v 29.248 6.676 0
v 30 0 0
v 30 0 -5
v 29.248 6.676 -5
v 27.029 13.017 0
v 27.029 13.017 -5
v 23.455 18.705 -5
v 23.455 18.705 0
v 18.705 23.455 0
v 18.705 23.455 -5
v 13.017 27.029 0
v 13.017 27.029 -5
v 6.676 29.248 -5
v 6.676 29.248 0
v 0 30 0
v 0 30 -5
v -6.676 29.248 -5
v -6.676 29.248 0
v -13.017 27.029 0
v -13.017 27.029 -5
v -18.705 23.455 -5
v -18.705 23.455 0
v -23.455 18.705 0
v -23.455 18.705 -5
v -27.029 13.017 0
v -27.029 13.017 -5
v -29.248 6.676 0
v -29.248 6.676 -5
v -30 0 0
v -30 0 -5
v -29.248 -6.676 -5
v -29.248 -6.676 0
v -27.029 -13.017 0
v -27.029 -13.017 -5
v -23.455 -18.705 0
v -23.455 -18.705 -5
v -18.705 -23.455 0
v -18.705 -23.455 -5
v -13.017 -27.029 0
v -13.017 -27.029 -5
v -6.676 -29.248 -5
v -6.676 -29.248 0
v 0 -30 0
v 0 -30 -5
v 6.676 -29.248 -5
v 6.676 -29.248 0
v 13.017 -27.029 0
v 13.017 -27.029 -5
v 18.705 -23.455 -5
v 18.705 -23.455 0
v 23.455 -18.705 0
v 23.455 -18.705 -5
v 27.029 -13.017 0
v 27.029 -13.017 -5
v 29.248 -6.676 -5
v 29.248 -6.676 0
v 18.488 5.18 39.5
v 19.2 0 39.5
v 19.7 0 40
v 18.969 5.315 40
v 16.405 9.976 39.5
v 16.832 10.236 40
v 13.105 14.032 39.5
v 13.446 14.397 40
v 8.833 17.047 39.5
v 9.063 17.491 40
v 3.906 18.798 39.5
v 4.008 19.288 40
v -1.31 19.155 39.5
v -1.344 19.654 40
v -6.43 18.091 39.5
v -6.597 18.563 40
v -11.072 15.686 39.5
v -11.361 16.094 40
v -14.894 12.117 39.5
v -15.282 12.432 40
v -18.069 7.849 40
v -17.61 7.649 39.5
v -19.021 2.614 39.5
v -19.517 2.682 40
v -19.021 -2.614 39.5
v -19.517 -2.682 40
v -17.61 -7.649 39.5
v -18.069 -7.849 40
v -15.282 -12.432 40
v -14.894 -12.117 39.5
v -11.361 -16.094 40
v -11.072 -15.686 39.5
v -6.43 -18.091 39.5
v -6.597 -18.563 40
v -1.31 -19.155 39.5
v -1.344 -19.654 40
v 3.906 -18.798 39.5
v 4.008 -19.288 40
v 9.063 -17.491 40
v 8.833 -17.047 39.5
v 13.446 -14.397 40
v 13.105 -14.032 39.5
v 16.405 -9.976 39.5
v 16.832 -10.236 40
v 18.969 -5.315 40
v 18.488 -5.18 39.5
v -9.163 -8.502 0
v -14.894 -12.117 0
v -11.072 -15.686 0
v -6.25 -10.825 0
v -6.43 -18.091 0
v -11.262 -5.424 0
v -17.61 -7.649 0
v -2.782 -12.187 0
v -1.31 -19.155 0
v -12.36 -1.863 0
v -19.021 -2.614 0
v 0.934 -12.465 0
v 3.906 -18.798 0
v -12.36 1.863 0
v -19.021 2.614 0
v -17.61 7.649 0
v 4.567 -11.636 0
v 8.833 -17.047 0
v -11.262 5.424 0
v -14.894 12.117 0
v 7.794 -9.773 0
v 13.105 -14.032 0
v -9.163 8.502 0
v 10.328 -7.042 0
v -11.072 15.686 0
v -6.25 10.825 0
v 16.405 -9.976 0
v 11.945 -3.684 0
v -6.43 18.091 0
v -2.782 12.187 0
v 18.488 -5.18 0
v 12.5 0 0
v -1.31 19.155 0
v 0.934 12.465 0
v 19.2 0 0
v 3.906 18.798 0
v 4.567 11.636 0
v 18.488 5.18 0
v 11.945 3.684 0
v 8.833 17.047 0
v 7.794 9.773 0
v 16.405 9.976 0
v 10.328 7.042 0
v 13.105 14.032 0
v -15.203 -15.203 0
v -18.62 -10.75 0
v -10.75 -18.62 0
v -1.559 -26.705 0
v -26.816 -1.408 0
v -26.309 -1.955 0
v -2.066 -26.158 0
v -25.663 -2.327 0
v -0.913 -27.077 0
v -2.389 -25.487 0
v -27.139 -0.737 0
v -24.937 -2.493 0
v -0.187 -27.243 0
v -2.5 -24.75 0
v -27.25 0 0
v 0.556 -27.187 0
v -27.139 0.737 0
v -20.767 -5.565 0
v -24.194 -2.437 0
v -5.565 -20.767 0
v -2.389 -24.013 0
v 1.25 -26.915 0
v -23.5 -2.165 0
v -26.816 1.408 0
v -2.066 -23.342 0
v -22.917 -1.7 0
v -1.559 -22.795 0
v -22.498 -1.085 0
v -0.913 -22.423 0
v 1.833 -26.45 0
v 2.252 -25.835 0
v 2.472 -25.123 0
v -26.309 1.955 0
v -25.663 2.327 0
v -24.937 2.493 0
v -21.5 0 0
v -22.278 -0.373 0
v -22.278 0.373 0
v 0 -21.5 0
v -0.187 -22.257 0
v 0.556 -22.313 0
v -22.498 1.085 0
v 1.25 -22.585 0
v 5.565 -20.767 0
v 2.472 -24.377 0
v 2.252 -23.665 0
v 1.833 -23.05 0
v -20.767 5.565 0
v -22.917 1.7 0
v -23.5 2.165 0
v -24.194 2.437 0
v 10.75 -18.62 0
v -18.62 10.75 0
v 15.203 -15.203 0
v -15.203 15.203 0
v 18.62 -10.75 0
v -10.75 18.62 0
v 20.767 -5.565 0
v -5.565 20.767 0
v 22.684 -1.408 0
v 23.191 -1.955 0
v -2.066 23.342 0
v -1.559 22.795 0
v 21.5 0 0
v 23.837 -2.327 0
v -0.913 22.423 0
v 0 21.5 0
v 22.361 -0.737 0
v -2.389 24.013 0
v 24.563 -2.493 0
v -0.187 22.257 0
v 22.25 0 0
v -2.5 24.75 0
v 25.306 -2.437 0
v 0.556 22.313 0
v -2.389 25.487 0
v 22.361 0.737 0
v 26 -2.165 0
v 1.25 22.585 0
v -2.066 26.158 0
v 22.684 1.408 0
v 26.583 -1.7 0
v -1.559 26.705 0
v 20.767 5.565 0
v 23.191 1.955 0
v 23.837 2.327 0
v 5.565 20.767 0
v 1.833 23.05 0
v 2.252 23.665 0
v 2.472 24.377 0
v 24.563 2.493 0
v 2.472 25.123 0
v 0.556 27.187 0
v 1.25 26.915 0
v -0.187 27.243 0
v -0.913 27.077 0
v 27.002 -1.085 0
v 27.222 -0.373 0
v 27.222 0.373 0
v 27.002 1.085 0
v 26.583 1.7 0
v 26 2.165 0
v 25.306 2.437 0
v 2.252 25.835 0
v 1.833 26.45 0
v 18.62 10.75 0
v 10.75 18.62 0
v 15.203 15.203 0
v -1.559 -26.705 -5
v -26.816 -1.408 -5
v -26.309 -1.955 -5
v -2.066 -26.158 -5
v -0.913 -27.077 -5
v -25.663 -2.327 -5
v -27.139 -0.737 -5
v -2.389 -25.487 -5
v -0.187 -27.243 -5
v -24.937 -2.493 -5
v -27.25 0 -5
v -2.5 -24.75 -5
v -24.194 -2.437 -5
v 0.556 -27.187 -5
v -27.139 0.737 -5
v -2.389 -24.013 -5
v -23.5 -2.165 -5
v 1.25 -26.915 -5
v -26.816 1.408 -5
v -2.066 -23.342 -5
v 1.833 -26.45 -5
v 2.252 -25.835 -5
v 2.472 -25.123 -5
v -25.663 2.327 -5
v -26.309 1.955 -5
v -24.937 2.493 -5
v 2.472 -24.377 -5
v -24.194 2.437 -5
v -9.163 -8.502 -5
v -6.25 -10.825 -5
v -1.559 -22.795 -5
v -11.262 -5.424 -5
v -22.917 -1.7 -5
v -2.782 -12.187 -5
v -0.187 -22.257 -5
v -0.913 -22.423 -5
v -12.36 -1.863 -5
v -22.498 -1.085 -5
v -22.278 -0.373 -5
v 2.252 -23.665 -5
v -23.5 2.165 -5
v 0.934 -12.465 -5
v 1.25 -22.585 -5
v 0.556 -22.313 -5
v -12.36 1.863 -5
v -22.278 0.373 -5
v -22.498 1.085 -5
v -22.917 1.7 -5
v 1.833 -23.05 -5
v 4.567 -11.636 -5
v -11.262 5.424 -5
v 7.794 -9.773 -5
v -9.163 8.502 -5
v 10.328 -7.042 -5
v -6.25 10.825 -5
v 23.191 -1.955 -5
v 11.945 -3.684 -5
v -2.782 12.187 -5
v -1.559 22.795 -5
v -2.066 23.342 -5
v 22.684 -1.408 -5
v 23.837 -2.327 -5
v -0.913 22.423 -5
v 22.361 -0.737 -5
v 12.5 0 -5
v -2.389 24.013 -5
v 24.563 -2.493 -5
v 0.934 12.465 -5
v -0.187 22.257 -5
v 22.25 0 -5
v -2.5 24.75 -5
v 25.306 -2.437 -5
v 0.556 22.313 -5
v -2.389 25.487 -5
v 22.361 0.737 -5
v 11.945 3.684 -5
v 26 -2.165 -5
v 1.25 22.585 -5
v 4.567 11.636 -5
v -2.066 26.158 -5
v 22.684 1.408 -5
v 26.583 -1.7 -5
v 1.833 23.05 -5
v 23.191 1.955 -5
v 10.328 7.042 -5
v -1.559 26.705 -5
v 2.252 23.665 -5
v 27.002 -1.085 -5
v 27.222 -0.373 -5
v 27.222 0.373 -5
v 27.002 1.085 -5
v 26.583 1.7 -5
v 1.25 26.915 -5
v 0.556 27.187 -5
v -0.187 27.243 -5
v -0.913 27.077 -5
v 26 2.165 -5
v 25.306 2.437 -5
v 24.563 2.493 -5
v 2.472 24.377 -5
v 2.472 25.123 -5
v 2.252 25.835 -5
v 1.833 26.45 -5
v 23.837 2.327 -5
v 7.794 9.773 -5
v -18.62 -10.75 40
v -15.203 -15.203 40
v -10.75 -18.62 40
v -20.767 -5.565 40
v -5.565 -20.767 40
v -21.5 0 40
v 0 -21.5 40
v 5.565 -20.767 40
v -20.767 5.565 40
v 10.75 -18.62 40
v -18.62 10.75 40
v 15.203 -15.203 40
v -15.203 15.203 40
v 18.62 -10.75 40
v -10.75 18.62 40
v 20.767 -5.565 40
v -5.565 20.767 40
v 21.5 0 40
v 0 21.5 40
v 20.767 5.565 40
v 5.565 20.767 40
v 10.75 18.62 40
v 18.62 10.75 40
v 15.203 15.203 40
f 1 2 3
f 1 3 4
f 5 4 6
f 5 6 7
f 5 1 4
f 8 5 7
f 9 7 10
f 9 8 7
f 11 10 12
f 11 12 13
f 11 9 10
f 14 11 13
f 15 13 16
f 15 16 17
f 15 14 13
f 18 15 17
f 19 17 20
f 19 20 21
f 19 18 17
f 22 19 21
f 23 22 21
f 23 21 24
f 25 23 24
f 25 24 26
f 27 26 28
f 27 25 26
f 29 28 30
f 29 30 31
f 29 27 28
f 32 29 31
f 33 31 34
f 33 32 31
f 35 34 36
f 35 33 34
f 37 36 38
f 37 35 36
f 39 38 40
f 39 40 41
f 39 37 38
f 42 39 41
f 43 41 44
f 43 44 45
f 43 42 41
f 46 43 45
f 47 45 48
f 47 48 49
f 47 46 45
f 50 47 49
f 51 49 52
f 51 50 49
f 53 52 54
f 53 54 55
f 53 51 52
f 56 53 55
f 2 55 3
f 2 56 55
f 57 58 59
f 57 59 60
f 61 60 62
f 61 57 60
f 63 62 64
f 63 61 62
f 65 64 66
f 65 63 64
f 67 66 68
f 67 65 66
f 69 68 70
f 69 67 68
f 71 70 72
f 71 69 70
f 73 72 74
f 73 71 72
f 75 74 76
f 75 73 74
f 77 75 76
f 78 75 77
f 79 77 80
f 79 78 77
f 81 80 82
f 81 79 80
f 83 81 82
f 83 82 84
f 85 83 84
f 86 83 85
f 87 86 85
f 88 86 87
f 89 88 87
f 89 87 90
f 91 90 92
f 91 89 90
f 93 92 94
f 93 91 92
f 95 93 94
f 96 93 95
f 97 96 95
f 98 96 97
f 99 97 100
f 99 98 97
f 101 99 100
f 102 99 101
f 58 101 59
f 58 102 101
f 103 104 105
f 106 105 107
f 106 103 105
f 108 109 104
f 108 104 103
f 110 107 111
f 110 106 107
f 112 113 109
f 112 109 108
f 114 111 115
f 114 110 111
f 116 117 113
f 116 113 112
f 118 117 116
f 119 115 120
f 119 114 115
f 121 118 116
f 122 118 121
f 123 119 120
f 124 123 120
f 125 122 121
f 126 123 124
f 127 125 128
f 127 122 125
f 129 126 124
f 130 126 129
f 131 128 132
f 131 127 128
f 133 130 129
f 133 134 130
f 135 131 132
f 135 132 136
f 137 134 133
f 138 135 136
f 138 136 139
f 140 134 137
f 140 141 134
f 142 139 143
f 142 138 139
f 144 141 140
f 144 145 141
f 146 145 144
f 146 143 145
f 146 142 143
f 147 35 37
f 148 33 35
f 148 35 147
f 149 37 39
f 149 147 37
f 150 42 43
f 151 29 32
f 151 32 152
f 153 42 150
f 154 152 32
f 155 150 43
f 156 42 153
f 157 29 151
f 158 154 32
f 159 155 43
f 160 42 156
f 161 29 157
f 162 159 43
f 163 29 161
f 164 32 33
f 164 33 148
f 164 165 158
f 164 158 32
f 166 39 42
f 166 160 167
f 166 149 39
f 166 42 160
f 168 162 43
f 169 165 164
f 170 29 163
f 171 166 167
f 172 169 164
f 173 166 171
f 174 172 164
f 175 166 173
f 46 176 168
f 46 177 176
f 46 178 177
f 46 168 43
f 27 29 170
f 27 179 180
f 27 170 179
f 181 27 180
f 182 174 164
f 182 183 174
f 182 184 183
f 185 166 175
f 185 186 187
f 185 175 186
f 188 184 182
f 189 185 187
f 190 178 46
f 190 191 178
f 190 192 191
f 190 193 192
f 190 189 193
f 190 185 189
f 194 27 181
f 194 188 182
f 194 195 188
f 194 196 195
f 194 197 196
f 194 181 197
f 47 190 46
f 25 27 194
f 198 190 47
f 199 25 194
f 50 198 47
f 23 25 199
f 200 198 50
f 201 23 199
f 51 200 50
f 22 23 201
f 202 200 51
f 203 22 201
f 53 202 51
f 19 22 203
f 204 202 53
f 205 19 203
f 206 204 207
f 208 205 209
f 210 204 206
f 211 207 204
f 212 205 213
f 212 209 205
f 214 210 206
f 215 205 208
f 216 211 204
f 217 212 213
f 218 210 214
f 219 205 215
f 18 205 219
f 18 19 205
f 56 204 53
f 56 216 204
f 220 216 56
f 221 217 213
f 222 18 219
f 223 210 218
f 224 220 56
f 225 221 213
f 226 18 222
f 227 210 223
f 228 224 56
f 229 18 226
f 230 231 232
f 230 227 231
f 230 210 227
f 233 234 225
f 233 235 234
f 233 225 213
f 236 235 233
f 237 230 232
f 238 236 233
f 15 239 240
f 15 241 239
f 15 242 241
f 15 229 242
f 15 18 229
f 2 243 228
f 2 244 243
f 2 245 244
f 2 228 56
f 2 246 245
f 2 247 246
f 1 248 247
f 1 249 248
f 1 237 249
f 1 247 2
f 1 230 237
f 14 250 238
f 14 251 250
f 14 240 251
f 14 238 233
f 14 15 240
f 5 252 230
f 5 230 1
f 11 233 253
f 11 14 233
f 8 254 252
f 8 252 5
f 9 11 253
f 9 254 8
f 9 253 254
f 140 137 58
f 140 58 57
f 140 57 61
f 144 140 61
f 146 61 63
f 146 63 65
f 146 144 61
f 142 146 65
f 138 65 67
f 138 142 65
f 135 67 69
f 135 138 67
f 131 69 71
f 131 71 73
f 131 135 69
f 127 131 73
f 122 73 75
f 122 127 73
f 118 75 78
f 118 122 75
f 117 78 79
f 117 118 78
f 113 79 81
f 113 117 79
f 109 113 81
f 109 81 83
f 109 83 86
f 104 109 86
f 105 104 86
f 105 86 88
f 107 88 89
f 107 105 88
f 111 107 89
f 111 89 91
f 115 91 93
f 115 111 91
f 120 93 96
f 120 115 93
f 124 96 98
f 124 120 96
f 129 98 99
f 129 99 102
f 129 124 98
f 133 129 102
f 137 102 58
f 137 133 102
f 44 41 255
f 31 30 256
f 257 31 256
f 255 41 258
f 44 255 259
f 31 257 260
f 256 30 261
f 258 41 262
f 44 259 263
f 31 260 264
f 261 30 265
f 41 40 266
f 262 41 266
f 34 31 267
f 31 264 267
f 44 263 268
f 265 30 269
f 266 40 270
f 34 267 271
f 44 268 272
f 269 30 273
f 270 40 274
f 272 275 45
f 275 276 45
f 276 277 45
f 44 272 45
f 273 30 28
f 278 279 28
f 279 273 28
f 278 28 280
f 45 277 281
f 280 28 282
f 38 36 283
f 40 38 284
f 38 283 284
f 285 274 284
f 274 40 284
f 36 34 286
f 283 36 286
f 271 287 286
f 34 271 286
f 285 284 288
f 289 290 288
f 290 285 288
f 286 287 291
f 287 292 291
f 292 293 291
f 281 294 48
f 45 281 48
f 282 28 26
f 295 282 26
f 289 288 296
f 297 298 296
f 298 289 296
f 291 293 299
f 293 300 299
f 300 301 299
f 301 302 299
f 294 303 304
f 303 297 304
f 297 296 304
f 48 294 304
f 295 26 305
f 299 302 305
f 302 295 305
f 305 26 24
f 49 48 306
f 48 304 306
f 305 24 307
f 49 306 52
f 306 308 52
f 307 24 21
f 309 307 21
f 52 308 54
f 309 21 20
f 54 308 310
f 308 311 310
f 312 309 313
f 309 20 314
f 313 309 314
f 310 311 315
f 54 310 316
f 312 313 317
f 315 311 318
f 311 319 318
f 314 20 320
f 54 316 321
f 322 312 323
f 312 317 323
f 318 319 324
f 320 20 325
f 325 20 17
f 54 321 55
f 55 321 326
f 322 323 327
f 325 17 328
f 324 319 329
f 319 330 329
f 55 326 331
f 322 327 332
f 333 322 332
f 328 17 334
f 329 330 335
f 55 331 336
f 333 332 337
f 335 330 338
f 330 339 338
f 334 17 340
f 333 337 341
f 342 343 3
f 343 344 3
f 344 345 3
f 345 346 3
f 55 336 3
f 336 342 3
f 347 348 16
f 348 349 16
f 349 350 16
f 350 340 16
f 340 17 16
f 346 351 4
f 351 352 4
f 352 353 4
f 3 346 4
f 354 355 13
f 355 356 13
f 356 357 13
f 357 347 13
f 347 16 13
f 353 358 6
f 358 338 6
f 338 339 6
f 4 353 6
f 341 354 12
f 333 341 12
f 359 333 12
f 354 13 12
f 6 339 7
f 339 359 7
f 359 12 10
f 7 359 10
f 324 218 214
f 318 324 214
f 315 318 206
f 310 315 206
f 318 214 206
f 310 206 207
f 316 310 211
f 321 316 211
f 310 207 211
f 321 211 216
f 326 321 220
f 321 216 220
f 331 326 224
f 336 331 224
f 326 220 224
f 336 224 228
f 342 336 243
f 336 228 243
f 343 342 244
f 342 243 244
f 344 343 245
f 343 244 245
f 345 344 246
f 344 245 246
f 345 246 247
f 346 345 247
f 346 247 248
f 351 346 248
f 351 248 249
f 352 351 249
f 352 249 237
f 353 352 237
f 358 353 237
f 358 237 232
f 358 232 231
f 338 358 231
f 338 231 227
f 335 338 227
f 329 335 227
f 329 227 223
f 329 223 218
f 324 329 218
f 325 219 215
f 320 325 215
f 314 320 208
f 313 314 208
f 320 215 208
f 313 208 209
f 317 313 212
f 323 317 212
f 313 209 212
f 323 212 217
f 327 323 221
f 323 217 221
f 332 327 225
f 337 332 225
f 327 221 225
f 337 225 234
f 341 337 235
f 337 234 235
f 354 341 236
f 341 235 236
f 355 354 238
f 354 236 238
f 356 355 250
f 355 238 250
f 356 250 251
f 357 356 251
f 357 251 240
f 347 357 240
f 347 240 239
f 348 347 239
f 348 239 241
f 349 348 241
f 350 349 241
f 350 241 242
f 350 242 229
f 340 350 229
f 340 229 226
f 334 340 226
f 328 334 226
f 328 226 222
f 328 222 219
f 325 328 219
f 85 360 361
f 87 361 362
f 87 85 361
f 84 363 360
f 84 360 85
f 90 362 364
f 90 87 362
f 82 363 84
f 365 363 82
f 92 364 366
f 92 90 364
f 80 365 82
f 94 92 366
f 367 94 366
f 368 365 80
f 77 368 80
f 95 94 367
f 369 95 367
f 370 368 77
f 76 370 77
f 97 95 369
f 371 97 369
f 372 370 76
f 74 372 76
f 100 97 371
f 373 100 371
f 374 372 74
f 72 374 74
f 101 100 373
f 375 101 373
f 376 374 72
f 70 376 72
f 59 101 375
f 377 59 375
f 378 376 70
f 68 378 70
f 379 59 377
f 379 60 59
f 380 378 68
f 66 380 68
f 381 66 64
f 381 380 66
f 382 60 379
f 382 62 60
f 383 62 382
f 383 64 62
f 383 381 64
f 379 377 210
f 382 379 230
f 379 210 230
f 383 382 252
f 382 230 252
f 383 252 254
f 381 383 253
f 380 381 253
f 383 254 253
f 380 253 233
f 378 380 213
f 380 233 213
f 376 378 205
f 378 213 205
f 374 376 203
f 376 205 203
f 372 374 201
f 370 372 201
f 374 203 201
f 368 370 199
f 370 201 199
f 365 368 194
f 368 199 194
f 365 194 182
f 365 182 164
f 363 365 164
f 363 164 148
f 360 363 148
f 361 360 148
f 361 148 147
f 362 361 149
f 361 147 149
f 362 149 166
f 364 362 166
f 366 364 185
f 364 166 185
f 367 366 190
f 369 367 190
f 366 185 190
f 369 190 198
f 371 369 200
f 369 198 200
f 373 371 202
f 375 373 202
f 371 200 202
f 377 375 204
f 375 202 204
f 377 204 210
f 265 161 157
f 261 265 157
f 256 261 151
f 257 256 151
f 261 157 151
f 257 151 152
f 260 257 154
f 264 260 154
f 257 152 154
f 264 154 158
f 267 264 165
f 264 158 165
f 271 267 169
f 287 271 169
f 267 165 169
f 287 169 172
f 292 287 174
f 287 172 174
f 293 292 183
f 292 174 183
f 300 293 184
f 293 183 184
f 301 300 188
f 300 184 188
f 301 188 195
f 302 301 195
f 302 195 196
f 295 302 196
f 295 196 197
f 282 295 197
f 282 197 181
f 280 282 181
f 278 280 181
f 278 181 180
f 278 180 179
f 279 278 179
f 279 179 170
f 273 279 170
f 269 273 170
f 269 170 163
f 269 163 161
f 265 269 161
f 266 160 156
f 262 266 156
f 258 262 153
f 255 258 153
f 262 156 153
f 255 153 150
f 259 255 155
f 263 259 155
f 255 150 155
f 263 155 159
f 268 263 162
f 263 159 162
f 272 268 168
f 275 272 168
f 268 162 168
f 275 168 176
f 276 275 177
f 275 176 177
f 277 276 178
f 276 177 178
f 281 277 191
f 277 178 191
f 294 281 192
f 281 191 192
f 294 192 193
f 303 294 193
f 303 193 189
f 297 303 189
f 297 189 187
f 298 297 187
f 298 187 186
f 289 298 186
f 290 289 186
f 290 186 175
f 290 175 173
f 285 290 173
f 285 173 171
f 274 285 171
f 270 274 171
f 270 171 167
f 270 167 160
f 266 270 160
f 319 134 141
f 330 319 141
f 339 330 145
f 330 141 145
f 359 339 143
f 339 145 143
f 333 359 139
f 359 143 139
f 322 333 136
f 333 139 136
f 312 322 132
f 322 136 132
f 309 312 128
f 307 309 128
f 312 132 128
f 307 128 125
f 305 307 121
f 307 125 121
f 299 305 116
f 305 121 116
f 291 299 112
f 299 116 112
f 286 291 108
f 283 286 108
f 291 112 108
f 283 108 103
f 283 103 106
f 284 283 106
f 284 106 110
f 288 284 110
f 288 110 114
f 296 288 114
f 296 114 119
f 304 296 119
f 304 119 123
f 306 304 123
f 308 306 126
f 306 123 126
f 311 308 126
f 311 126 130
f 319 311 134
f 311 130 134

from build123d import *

# Parameters (mm, degrees)
F0_R     = 21.5
F0_R_2   = 19.2
F1_DEPTH = 40
F2_R     = 30
F2_R_2   = 12.5
F3_DEPTH = 5
F5_D     = 5
F6_SIZE  = 0.5


with BuildPart() as f1:
    # F0 (on Top) → F1 (new body)
    with BuildSketch(Plane.XY):
        Circle(F0_R)
        Circle(F0_R_2, mode=Mode.SUBTRACT)
    extrude(amount=F1_DEPTH)

    # F2 (on Top) → F3 (join)
    with BuildSketch(Plane.XY):
        Circle(F2_R)
        Circle(F2_R_2, mode=Mode.SUBTRACT)
    extrude(amount=-F3_DEPTH)

    # F5 (through all)
    with Locations(Plane(origin=(0, 0, -5), x_dir=(1, 0, 0), z_dir=(0, 0, -1))):
        with Locations((-24.75, 0), (0, 24.75), (24.75, 0), (0, -24.75)):
            Hole(F5_D / 2)

    # F6
    f6_edges = [f1.edges().sort_by_distance(p)[0] for p in [
        (-19.2, 0, 40),
    ]]
    chamfer(f6_edges, length=F6_SIZE)


solid = f1.part
